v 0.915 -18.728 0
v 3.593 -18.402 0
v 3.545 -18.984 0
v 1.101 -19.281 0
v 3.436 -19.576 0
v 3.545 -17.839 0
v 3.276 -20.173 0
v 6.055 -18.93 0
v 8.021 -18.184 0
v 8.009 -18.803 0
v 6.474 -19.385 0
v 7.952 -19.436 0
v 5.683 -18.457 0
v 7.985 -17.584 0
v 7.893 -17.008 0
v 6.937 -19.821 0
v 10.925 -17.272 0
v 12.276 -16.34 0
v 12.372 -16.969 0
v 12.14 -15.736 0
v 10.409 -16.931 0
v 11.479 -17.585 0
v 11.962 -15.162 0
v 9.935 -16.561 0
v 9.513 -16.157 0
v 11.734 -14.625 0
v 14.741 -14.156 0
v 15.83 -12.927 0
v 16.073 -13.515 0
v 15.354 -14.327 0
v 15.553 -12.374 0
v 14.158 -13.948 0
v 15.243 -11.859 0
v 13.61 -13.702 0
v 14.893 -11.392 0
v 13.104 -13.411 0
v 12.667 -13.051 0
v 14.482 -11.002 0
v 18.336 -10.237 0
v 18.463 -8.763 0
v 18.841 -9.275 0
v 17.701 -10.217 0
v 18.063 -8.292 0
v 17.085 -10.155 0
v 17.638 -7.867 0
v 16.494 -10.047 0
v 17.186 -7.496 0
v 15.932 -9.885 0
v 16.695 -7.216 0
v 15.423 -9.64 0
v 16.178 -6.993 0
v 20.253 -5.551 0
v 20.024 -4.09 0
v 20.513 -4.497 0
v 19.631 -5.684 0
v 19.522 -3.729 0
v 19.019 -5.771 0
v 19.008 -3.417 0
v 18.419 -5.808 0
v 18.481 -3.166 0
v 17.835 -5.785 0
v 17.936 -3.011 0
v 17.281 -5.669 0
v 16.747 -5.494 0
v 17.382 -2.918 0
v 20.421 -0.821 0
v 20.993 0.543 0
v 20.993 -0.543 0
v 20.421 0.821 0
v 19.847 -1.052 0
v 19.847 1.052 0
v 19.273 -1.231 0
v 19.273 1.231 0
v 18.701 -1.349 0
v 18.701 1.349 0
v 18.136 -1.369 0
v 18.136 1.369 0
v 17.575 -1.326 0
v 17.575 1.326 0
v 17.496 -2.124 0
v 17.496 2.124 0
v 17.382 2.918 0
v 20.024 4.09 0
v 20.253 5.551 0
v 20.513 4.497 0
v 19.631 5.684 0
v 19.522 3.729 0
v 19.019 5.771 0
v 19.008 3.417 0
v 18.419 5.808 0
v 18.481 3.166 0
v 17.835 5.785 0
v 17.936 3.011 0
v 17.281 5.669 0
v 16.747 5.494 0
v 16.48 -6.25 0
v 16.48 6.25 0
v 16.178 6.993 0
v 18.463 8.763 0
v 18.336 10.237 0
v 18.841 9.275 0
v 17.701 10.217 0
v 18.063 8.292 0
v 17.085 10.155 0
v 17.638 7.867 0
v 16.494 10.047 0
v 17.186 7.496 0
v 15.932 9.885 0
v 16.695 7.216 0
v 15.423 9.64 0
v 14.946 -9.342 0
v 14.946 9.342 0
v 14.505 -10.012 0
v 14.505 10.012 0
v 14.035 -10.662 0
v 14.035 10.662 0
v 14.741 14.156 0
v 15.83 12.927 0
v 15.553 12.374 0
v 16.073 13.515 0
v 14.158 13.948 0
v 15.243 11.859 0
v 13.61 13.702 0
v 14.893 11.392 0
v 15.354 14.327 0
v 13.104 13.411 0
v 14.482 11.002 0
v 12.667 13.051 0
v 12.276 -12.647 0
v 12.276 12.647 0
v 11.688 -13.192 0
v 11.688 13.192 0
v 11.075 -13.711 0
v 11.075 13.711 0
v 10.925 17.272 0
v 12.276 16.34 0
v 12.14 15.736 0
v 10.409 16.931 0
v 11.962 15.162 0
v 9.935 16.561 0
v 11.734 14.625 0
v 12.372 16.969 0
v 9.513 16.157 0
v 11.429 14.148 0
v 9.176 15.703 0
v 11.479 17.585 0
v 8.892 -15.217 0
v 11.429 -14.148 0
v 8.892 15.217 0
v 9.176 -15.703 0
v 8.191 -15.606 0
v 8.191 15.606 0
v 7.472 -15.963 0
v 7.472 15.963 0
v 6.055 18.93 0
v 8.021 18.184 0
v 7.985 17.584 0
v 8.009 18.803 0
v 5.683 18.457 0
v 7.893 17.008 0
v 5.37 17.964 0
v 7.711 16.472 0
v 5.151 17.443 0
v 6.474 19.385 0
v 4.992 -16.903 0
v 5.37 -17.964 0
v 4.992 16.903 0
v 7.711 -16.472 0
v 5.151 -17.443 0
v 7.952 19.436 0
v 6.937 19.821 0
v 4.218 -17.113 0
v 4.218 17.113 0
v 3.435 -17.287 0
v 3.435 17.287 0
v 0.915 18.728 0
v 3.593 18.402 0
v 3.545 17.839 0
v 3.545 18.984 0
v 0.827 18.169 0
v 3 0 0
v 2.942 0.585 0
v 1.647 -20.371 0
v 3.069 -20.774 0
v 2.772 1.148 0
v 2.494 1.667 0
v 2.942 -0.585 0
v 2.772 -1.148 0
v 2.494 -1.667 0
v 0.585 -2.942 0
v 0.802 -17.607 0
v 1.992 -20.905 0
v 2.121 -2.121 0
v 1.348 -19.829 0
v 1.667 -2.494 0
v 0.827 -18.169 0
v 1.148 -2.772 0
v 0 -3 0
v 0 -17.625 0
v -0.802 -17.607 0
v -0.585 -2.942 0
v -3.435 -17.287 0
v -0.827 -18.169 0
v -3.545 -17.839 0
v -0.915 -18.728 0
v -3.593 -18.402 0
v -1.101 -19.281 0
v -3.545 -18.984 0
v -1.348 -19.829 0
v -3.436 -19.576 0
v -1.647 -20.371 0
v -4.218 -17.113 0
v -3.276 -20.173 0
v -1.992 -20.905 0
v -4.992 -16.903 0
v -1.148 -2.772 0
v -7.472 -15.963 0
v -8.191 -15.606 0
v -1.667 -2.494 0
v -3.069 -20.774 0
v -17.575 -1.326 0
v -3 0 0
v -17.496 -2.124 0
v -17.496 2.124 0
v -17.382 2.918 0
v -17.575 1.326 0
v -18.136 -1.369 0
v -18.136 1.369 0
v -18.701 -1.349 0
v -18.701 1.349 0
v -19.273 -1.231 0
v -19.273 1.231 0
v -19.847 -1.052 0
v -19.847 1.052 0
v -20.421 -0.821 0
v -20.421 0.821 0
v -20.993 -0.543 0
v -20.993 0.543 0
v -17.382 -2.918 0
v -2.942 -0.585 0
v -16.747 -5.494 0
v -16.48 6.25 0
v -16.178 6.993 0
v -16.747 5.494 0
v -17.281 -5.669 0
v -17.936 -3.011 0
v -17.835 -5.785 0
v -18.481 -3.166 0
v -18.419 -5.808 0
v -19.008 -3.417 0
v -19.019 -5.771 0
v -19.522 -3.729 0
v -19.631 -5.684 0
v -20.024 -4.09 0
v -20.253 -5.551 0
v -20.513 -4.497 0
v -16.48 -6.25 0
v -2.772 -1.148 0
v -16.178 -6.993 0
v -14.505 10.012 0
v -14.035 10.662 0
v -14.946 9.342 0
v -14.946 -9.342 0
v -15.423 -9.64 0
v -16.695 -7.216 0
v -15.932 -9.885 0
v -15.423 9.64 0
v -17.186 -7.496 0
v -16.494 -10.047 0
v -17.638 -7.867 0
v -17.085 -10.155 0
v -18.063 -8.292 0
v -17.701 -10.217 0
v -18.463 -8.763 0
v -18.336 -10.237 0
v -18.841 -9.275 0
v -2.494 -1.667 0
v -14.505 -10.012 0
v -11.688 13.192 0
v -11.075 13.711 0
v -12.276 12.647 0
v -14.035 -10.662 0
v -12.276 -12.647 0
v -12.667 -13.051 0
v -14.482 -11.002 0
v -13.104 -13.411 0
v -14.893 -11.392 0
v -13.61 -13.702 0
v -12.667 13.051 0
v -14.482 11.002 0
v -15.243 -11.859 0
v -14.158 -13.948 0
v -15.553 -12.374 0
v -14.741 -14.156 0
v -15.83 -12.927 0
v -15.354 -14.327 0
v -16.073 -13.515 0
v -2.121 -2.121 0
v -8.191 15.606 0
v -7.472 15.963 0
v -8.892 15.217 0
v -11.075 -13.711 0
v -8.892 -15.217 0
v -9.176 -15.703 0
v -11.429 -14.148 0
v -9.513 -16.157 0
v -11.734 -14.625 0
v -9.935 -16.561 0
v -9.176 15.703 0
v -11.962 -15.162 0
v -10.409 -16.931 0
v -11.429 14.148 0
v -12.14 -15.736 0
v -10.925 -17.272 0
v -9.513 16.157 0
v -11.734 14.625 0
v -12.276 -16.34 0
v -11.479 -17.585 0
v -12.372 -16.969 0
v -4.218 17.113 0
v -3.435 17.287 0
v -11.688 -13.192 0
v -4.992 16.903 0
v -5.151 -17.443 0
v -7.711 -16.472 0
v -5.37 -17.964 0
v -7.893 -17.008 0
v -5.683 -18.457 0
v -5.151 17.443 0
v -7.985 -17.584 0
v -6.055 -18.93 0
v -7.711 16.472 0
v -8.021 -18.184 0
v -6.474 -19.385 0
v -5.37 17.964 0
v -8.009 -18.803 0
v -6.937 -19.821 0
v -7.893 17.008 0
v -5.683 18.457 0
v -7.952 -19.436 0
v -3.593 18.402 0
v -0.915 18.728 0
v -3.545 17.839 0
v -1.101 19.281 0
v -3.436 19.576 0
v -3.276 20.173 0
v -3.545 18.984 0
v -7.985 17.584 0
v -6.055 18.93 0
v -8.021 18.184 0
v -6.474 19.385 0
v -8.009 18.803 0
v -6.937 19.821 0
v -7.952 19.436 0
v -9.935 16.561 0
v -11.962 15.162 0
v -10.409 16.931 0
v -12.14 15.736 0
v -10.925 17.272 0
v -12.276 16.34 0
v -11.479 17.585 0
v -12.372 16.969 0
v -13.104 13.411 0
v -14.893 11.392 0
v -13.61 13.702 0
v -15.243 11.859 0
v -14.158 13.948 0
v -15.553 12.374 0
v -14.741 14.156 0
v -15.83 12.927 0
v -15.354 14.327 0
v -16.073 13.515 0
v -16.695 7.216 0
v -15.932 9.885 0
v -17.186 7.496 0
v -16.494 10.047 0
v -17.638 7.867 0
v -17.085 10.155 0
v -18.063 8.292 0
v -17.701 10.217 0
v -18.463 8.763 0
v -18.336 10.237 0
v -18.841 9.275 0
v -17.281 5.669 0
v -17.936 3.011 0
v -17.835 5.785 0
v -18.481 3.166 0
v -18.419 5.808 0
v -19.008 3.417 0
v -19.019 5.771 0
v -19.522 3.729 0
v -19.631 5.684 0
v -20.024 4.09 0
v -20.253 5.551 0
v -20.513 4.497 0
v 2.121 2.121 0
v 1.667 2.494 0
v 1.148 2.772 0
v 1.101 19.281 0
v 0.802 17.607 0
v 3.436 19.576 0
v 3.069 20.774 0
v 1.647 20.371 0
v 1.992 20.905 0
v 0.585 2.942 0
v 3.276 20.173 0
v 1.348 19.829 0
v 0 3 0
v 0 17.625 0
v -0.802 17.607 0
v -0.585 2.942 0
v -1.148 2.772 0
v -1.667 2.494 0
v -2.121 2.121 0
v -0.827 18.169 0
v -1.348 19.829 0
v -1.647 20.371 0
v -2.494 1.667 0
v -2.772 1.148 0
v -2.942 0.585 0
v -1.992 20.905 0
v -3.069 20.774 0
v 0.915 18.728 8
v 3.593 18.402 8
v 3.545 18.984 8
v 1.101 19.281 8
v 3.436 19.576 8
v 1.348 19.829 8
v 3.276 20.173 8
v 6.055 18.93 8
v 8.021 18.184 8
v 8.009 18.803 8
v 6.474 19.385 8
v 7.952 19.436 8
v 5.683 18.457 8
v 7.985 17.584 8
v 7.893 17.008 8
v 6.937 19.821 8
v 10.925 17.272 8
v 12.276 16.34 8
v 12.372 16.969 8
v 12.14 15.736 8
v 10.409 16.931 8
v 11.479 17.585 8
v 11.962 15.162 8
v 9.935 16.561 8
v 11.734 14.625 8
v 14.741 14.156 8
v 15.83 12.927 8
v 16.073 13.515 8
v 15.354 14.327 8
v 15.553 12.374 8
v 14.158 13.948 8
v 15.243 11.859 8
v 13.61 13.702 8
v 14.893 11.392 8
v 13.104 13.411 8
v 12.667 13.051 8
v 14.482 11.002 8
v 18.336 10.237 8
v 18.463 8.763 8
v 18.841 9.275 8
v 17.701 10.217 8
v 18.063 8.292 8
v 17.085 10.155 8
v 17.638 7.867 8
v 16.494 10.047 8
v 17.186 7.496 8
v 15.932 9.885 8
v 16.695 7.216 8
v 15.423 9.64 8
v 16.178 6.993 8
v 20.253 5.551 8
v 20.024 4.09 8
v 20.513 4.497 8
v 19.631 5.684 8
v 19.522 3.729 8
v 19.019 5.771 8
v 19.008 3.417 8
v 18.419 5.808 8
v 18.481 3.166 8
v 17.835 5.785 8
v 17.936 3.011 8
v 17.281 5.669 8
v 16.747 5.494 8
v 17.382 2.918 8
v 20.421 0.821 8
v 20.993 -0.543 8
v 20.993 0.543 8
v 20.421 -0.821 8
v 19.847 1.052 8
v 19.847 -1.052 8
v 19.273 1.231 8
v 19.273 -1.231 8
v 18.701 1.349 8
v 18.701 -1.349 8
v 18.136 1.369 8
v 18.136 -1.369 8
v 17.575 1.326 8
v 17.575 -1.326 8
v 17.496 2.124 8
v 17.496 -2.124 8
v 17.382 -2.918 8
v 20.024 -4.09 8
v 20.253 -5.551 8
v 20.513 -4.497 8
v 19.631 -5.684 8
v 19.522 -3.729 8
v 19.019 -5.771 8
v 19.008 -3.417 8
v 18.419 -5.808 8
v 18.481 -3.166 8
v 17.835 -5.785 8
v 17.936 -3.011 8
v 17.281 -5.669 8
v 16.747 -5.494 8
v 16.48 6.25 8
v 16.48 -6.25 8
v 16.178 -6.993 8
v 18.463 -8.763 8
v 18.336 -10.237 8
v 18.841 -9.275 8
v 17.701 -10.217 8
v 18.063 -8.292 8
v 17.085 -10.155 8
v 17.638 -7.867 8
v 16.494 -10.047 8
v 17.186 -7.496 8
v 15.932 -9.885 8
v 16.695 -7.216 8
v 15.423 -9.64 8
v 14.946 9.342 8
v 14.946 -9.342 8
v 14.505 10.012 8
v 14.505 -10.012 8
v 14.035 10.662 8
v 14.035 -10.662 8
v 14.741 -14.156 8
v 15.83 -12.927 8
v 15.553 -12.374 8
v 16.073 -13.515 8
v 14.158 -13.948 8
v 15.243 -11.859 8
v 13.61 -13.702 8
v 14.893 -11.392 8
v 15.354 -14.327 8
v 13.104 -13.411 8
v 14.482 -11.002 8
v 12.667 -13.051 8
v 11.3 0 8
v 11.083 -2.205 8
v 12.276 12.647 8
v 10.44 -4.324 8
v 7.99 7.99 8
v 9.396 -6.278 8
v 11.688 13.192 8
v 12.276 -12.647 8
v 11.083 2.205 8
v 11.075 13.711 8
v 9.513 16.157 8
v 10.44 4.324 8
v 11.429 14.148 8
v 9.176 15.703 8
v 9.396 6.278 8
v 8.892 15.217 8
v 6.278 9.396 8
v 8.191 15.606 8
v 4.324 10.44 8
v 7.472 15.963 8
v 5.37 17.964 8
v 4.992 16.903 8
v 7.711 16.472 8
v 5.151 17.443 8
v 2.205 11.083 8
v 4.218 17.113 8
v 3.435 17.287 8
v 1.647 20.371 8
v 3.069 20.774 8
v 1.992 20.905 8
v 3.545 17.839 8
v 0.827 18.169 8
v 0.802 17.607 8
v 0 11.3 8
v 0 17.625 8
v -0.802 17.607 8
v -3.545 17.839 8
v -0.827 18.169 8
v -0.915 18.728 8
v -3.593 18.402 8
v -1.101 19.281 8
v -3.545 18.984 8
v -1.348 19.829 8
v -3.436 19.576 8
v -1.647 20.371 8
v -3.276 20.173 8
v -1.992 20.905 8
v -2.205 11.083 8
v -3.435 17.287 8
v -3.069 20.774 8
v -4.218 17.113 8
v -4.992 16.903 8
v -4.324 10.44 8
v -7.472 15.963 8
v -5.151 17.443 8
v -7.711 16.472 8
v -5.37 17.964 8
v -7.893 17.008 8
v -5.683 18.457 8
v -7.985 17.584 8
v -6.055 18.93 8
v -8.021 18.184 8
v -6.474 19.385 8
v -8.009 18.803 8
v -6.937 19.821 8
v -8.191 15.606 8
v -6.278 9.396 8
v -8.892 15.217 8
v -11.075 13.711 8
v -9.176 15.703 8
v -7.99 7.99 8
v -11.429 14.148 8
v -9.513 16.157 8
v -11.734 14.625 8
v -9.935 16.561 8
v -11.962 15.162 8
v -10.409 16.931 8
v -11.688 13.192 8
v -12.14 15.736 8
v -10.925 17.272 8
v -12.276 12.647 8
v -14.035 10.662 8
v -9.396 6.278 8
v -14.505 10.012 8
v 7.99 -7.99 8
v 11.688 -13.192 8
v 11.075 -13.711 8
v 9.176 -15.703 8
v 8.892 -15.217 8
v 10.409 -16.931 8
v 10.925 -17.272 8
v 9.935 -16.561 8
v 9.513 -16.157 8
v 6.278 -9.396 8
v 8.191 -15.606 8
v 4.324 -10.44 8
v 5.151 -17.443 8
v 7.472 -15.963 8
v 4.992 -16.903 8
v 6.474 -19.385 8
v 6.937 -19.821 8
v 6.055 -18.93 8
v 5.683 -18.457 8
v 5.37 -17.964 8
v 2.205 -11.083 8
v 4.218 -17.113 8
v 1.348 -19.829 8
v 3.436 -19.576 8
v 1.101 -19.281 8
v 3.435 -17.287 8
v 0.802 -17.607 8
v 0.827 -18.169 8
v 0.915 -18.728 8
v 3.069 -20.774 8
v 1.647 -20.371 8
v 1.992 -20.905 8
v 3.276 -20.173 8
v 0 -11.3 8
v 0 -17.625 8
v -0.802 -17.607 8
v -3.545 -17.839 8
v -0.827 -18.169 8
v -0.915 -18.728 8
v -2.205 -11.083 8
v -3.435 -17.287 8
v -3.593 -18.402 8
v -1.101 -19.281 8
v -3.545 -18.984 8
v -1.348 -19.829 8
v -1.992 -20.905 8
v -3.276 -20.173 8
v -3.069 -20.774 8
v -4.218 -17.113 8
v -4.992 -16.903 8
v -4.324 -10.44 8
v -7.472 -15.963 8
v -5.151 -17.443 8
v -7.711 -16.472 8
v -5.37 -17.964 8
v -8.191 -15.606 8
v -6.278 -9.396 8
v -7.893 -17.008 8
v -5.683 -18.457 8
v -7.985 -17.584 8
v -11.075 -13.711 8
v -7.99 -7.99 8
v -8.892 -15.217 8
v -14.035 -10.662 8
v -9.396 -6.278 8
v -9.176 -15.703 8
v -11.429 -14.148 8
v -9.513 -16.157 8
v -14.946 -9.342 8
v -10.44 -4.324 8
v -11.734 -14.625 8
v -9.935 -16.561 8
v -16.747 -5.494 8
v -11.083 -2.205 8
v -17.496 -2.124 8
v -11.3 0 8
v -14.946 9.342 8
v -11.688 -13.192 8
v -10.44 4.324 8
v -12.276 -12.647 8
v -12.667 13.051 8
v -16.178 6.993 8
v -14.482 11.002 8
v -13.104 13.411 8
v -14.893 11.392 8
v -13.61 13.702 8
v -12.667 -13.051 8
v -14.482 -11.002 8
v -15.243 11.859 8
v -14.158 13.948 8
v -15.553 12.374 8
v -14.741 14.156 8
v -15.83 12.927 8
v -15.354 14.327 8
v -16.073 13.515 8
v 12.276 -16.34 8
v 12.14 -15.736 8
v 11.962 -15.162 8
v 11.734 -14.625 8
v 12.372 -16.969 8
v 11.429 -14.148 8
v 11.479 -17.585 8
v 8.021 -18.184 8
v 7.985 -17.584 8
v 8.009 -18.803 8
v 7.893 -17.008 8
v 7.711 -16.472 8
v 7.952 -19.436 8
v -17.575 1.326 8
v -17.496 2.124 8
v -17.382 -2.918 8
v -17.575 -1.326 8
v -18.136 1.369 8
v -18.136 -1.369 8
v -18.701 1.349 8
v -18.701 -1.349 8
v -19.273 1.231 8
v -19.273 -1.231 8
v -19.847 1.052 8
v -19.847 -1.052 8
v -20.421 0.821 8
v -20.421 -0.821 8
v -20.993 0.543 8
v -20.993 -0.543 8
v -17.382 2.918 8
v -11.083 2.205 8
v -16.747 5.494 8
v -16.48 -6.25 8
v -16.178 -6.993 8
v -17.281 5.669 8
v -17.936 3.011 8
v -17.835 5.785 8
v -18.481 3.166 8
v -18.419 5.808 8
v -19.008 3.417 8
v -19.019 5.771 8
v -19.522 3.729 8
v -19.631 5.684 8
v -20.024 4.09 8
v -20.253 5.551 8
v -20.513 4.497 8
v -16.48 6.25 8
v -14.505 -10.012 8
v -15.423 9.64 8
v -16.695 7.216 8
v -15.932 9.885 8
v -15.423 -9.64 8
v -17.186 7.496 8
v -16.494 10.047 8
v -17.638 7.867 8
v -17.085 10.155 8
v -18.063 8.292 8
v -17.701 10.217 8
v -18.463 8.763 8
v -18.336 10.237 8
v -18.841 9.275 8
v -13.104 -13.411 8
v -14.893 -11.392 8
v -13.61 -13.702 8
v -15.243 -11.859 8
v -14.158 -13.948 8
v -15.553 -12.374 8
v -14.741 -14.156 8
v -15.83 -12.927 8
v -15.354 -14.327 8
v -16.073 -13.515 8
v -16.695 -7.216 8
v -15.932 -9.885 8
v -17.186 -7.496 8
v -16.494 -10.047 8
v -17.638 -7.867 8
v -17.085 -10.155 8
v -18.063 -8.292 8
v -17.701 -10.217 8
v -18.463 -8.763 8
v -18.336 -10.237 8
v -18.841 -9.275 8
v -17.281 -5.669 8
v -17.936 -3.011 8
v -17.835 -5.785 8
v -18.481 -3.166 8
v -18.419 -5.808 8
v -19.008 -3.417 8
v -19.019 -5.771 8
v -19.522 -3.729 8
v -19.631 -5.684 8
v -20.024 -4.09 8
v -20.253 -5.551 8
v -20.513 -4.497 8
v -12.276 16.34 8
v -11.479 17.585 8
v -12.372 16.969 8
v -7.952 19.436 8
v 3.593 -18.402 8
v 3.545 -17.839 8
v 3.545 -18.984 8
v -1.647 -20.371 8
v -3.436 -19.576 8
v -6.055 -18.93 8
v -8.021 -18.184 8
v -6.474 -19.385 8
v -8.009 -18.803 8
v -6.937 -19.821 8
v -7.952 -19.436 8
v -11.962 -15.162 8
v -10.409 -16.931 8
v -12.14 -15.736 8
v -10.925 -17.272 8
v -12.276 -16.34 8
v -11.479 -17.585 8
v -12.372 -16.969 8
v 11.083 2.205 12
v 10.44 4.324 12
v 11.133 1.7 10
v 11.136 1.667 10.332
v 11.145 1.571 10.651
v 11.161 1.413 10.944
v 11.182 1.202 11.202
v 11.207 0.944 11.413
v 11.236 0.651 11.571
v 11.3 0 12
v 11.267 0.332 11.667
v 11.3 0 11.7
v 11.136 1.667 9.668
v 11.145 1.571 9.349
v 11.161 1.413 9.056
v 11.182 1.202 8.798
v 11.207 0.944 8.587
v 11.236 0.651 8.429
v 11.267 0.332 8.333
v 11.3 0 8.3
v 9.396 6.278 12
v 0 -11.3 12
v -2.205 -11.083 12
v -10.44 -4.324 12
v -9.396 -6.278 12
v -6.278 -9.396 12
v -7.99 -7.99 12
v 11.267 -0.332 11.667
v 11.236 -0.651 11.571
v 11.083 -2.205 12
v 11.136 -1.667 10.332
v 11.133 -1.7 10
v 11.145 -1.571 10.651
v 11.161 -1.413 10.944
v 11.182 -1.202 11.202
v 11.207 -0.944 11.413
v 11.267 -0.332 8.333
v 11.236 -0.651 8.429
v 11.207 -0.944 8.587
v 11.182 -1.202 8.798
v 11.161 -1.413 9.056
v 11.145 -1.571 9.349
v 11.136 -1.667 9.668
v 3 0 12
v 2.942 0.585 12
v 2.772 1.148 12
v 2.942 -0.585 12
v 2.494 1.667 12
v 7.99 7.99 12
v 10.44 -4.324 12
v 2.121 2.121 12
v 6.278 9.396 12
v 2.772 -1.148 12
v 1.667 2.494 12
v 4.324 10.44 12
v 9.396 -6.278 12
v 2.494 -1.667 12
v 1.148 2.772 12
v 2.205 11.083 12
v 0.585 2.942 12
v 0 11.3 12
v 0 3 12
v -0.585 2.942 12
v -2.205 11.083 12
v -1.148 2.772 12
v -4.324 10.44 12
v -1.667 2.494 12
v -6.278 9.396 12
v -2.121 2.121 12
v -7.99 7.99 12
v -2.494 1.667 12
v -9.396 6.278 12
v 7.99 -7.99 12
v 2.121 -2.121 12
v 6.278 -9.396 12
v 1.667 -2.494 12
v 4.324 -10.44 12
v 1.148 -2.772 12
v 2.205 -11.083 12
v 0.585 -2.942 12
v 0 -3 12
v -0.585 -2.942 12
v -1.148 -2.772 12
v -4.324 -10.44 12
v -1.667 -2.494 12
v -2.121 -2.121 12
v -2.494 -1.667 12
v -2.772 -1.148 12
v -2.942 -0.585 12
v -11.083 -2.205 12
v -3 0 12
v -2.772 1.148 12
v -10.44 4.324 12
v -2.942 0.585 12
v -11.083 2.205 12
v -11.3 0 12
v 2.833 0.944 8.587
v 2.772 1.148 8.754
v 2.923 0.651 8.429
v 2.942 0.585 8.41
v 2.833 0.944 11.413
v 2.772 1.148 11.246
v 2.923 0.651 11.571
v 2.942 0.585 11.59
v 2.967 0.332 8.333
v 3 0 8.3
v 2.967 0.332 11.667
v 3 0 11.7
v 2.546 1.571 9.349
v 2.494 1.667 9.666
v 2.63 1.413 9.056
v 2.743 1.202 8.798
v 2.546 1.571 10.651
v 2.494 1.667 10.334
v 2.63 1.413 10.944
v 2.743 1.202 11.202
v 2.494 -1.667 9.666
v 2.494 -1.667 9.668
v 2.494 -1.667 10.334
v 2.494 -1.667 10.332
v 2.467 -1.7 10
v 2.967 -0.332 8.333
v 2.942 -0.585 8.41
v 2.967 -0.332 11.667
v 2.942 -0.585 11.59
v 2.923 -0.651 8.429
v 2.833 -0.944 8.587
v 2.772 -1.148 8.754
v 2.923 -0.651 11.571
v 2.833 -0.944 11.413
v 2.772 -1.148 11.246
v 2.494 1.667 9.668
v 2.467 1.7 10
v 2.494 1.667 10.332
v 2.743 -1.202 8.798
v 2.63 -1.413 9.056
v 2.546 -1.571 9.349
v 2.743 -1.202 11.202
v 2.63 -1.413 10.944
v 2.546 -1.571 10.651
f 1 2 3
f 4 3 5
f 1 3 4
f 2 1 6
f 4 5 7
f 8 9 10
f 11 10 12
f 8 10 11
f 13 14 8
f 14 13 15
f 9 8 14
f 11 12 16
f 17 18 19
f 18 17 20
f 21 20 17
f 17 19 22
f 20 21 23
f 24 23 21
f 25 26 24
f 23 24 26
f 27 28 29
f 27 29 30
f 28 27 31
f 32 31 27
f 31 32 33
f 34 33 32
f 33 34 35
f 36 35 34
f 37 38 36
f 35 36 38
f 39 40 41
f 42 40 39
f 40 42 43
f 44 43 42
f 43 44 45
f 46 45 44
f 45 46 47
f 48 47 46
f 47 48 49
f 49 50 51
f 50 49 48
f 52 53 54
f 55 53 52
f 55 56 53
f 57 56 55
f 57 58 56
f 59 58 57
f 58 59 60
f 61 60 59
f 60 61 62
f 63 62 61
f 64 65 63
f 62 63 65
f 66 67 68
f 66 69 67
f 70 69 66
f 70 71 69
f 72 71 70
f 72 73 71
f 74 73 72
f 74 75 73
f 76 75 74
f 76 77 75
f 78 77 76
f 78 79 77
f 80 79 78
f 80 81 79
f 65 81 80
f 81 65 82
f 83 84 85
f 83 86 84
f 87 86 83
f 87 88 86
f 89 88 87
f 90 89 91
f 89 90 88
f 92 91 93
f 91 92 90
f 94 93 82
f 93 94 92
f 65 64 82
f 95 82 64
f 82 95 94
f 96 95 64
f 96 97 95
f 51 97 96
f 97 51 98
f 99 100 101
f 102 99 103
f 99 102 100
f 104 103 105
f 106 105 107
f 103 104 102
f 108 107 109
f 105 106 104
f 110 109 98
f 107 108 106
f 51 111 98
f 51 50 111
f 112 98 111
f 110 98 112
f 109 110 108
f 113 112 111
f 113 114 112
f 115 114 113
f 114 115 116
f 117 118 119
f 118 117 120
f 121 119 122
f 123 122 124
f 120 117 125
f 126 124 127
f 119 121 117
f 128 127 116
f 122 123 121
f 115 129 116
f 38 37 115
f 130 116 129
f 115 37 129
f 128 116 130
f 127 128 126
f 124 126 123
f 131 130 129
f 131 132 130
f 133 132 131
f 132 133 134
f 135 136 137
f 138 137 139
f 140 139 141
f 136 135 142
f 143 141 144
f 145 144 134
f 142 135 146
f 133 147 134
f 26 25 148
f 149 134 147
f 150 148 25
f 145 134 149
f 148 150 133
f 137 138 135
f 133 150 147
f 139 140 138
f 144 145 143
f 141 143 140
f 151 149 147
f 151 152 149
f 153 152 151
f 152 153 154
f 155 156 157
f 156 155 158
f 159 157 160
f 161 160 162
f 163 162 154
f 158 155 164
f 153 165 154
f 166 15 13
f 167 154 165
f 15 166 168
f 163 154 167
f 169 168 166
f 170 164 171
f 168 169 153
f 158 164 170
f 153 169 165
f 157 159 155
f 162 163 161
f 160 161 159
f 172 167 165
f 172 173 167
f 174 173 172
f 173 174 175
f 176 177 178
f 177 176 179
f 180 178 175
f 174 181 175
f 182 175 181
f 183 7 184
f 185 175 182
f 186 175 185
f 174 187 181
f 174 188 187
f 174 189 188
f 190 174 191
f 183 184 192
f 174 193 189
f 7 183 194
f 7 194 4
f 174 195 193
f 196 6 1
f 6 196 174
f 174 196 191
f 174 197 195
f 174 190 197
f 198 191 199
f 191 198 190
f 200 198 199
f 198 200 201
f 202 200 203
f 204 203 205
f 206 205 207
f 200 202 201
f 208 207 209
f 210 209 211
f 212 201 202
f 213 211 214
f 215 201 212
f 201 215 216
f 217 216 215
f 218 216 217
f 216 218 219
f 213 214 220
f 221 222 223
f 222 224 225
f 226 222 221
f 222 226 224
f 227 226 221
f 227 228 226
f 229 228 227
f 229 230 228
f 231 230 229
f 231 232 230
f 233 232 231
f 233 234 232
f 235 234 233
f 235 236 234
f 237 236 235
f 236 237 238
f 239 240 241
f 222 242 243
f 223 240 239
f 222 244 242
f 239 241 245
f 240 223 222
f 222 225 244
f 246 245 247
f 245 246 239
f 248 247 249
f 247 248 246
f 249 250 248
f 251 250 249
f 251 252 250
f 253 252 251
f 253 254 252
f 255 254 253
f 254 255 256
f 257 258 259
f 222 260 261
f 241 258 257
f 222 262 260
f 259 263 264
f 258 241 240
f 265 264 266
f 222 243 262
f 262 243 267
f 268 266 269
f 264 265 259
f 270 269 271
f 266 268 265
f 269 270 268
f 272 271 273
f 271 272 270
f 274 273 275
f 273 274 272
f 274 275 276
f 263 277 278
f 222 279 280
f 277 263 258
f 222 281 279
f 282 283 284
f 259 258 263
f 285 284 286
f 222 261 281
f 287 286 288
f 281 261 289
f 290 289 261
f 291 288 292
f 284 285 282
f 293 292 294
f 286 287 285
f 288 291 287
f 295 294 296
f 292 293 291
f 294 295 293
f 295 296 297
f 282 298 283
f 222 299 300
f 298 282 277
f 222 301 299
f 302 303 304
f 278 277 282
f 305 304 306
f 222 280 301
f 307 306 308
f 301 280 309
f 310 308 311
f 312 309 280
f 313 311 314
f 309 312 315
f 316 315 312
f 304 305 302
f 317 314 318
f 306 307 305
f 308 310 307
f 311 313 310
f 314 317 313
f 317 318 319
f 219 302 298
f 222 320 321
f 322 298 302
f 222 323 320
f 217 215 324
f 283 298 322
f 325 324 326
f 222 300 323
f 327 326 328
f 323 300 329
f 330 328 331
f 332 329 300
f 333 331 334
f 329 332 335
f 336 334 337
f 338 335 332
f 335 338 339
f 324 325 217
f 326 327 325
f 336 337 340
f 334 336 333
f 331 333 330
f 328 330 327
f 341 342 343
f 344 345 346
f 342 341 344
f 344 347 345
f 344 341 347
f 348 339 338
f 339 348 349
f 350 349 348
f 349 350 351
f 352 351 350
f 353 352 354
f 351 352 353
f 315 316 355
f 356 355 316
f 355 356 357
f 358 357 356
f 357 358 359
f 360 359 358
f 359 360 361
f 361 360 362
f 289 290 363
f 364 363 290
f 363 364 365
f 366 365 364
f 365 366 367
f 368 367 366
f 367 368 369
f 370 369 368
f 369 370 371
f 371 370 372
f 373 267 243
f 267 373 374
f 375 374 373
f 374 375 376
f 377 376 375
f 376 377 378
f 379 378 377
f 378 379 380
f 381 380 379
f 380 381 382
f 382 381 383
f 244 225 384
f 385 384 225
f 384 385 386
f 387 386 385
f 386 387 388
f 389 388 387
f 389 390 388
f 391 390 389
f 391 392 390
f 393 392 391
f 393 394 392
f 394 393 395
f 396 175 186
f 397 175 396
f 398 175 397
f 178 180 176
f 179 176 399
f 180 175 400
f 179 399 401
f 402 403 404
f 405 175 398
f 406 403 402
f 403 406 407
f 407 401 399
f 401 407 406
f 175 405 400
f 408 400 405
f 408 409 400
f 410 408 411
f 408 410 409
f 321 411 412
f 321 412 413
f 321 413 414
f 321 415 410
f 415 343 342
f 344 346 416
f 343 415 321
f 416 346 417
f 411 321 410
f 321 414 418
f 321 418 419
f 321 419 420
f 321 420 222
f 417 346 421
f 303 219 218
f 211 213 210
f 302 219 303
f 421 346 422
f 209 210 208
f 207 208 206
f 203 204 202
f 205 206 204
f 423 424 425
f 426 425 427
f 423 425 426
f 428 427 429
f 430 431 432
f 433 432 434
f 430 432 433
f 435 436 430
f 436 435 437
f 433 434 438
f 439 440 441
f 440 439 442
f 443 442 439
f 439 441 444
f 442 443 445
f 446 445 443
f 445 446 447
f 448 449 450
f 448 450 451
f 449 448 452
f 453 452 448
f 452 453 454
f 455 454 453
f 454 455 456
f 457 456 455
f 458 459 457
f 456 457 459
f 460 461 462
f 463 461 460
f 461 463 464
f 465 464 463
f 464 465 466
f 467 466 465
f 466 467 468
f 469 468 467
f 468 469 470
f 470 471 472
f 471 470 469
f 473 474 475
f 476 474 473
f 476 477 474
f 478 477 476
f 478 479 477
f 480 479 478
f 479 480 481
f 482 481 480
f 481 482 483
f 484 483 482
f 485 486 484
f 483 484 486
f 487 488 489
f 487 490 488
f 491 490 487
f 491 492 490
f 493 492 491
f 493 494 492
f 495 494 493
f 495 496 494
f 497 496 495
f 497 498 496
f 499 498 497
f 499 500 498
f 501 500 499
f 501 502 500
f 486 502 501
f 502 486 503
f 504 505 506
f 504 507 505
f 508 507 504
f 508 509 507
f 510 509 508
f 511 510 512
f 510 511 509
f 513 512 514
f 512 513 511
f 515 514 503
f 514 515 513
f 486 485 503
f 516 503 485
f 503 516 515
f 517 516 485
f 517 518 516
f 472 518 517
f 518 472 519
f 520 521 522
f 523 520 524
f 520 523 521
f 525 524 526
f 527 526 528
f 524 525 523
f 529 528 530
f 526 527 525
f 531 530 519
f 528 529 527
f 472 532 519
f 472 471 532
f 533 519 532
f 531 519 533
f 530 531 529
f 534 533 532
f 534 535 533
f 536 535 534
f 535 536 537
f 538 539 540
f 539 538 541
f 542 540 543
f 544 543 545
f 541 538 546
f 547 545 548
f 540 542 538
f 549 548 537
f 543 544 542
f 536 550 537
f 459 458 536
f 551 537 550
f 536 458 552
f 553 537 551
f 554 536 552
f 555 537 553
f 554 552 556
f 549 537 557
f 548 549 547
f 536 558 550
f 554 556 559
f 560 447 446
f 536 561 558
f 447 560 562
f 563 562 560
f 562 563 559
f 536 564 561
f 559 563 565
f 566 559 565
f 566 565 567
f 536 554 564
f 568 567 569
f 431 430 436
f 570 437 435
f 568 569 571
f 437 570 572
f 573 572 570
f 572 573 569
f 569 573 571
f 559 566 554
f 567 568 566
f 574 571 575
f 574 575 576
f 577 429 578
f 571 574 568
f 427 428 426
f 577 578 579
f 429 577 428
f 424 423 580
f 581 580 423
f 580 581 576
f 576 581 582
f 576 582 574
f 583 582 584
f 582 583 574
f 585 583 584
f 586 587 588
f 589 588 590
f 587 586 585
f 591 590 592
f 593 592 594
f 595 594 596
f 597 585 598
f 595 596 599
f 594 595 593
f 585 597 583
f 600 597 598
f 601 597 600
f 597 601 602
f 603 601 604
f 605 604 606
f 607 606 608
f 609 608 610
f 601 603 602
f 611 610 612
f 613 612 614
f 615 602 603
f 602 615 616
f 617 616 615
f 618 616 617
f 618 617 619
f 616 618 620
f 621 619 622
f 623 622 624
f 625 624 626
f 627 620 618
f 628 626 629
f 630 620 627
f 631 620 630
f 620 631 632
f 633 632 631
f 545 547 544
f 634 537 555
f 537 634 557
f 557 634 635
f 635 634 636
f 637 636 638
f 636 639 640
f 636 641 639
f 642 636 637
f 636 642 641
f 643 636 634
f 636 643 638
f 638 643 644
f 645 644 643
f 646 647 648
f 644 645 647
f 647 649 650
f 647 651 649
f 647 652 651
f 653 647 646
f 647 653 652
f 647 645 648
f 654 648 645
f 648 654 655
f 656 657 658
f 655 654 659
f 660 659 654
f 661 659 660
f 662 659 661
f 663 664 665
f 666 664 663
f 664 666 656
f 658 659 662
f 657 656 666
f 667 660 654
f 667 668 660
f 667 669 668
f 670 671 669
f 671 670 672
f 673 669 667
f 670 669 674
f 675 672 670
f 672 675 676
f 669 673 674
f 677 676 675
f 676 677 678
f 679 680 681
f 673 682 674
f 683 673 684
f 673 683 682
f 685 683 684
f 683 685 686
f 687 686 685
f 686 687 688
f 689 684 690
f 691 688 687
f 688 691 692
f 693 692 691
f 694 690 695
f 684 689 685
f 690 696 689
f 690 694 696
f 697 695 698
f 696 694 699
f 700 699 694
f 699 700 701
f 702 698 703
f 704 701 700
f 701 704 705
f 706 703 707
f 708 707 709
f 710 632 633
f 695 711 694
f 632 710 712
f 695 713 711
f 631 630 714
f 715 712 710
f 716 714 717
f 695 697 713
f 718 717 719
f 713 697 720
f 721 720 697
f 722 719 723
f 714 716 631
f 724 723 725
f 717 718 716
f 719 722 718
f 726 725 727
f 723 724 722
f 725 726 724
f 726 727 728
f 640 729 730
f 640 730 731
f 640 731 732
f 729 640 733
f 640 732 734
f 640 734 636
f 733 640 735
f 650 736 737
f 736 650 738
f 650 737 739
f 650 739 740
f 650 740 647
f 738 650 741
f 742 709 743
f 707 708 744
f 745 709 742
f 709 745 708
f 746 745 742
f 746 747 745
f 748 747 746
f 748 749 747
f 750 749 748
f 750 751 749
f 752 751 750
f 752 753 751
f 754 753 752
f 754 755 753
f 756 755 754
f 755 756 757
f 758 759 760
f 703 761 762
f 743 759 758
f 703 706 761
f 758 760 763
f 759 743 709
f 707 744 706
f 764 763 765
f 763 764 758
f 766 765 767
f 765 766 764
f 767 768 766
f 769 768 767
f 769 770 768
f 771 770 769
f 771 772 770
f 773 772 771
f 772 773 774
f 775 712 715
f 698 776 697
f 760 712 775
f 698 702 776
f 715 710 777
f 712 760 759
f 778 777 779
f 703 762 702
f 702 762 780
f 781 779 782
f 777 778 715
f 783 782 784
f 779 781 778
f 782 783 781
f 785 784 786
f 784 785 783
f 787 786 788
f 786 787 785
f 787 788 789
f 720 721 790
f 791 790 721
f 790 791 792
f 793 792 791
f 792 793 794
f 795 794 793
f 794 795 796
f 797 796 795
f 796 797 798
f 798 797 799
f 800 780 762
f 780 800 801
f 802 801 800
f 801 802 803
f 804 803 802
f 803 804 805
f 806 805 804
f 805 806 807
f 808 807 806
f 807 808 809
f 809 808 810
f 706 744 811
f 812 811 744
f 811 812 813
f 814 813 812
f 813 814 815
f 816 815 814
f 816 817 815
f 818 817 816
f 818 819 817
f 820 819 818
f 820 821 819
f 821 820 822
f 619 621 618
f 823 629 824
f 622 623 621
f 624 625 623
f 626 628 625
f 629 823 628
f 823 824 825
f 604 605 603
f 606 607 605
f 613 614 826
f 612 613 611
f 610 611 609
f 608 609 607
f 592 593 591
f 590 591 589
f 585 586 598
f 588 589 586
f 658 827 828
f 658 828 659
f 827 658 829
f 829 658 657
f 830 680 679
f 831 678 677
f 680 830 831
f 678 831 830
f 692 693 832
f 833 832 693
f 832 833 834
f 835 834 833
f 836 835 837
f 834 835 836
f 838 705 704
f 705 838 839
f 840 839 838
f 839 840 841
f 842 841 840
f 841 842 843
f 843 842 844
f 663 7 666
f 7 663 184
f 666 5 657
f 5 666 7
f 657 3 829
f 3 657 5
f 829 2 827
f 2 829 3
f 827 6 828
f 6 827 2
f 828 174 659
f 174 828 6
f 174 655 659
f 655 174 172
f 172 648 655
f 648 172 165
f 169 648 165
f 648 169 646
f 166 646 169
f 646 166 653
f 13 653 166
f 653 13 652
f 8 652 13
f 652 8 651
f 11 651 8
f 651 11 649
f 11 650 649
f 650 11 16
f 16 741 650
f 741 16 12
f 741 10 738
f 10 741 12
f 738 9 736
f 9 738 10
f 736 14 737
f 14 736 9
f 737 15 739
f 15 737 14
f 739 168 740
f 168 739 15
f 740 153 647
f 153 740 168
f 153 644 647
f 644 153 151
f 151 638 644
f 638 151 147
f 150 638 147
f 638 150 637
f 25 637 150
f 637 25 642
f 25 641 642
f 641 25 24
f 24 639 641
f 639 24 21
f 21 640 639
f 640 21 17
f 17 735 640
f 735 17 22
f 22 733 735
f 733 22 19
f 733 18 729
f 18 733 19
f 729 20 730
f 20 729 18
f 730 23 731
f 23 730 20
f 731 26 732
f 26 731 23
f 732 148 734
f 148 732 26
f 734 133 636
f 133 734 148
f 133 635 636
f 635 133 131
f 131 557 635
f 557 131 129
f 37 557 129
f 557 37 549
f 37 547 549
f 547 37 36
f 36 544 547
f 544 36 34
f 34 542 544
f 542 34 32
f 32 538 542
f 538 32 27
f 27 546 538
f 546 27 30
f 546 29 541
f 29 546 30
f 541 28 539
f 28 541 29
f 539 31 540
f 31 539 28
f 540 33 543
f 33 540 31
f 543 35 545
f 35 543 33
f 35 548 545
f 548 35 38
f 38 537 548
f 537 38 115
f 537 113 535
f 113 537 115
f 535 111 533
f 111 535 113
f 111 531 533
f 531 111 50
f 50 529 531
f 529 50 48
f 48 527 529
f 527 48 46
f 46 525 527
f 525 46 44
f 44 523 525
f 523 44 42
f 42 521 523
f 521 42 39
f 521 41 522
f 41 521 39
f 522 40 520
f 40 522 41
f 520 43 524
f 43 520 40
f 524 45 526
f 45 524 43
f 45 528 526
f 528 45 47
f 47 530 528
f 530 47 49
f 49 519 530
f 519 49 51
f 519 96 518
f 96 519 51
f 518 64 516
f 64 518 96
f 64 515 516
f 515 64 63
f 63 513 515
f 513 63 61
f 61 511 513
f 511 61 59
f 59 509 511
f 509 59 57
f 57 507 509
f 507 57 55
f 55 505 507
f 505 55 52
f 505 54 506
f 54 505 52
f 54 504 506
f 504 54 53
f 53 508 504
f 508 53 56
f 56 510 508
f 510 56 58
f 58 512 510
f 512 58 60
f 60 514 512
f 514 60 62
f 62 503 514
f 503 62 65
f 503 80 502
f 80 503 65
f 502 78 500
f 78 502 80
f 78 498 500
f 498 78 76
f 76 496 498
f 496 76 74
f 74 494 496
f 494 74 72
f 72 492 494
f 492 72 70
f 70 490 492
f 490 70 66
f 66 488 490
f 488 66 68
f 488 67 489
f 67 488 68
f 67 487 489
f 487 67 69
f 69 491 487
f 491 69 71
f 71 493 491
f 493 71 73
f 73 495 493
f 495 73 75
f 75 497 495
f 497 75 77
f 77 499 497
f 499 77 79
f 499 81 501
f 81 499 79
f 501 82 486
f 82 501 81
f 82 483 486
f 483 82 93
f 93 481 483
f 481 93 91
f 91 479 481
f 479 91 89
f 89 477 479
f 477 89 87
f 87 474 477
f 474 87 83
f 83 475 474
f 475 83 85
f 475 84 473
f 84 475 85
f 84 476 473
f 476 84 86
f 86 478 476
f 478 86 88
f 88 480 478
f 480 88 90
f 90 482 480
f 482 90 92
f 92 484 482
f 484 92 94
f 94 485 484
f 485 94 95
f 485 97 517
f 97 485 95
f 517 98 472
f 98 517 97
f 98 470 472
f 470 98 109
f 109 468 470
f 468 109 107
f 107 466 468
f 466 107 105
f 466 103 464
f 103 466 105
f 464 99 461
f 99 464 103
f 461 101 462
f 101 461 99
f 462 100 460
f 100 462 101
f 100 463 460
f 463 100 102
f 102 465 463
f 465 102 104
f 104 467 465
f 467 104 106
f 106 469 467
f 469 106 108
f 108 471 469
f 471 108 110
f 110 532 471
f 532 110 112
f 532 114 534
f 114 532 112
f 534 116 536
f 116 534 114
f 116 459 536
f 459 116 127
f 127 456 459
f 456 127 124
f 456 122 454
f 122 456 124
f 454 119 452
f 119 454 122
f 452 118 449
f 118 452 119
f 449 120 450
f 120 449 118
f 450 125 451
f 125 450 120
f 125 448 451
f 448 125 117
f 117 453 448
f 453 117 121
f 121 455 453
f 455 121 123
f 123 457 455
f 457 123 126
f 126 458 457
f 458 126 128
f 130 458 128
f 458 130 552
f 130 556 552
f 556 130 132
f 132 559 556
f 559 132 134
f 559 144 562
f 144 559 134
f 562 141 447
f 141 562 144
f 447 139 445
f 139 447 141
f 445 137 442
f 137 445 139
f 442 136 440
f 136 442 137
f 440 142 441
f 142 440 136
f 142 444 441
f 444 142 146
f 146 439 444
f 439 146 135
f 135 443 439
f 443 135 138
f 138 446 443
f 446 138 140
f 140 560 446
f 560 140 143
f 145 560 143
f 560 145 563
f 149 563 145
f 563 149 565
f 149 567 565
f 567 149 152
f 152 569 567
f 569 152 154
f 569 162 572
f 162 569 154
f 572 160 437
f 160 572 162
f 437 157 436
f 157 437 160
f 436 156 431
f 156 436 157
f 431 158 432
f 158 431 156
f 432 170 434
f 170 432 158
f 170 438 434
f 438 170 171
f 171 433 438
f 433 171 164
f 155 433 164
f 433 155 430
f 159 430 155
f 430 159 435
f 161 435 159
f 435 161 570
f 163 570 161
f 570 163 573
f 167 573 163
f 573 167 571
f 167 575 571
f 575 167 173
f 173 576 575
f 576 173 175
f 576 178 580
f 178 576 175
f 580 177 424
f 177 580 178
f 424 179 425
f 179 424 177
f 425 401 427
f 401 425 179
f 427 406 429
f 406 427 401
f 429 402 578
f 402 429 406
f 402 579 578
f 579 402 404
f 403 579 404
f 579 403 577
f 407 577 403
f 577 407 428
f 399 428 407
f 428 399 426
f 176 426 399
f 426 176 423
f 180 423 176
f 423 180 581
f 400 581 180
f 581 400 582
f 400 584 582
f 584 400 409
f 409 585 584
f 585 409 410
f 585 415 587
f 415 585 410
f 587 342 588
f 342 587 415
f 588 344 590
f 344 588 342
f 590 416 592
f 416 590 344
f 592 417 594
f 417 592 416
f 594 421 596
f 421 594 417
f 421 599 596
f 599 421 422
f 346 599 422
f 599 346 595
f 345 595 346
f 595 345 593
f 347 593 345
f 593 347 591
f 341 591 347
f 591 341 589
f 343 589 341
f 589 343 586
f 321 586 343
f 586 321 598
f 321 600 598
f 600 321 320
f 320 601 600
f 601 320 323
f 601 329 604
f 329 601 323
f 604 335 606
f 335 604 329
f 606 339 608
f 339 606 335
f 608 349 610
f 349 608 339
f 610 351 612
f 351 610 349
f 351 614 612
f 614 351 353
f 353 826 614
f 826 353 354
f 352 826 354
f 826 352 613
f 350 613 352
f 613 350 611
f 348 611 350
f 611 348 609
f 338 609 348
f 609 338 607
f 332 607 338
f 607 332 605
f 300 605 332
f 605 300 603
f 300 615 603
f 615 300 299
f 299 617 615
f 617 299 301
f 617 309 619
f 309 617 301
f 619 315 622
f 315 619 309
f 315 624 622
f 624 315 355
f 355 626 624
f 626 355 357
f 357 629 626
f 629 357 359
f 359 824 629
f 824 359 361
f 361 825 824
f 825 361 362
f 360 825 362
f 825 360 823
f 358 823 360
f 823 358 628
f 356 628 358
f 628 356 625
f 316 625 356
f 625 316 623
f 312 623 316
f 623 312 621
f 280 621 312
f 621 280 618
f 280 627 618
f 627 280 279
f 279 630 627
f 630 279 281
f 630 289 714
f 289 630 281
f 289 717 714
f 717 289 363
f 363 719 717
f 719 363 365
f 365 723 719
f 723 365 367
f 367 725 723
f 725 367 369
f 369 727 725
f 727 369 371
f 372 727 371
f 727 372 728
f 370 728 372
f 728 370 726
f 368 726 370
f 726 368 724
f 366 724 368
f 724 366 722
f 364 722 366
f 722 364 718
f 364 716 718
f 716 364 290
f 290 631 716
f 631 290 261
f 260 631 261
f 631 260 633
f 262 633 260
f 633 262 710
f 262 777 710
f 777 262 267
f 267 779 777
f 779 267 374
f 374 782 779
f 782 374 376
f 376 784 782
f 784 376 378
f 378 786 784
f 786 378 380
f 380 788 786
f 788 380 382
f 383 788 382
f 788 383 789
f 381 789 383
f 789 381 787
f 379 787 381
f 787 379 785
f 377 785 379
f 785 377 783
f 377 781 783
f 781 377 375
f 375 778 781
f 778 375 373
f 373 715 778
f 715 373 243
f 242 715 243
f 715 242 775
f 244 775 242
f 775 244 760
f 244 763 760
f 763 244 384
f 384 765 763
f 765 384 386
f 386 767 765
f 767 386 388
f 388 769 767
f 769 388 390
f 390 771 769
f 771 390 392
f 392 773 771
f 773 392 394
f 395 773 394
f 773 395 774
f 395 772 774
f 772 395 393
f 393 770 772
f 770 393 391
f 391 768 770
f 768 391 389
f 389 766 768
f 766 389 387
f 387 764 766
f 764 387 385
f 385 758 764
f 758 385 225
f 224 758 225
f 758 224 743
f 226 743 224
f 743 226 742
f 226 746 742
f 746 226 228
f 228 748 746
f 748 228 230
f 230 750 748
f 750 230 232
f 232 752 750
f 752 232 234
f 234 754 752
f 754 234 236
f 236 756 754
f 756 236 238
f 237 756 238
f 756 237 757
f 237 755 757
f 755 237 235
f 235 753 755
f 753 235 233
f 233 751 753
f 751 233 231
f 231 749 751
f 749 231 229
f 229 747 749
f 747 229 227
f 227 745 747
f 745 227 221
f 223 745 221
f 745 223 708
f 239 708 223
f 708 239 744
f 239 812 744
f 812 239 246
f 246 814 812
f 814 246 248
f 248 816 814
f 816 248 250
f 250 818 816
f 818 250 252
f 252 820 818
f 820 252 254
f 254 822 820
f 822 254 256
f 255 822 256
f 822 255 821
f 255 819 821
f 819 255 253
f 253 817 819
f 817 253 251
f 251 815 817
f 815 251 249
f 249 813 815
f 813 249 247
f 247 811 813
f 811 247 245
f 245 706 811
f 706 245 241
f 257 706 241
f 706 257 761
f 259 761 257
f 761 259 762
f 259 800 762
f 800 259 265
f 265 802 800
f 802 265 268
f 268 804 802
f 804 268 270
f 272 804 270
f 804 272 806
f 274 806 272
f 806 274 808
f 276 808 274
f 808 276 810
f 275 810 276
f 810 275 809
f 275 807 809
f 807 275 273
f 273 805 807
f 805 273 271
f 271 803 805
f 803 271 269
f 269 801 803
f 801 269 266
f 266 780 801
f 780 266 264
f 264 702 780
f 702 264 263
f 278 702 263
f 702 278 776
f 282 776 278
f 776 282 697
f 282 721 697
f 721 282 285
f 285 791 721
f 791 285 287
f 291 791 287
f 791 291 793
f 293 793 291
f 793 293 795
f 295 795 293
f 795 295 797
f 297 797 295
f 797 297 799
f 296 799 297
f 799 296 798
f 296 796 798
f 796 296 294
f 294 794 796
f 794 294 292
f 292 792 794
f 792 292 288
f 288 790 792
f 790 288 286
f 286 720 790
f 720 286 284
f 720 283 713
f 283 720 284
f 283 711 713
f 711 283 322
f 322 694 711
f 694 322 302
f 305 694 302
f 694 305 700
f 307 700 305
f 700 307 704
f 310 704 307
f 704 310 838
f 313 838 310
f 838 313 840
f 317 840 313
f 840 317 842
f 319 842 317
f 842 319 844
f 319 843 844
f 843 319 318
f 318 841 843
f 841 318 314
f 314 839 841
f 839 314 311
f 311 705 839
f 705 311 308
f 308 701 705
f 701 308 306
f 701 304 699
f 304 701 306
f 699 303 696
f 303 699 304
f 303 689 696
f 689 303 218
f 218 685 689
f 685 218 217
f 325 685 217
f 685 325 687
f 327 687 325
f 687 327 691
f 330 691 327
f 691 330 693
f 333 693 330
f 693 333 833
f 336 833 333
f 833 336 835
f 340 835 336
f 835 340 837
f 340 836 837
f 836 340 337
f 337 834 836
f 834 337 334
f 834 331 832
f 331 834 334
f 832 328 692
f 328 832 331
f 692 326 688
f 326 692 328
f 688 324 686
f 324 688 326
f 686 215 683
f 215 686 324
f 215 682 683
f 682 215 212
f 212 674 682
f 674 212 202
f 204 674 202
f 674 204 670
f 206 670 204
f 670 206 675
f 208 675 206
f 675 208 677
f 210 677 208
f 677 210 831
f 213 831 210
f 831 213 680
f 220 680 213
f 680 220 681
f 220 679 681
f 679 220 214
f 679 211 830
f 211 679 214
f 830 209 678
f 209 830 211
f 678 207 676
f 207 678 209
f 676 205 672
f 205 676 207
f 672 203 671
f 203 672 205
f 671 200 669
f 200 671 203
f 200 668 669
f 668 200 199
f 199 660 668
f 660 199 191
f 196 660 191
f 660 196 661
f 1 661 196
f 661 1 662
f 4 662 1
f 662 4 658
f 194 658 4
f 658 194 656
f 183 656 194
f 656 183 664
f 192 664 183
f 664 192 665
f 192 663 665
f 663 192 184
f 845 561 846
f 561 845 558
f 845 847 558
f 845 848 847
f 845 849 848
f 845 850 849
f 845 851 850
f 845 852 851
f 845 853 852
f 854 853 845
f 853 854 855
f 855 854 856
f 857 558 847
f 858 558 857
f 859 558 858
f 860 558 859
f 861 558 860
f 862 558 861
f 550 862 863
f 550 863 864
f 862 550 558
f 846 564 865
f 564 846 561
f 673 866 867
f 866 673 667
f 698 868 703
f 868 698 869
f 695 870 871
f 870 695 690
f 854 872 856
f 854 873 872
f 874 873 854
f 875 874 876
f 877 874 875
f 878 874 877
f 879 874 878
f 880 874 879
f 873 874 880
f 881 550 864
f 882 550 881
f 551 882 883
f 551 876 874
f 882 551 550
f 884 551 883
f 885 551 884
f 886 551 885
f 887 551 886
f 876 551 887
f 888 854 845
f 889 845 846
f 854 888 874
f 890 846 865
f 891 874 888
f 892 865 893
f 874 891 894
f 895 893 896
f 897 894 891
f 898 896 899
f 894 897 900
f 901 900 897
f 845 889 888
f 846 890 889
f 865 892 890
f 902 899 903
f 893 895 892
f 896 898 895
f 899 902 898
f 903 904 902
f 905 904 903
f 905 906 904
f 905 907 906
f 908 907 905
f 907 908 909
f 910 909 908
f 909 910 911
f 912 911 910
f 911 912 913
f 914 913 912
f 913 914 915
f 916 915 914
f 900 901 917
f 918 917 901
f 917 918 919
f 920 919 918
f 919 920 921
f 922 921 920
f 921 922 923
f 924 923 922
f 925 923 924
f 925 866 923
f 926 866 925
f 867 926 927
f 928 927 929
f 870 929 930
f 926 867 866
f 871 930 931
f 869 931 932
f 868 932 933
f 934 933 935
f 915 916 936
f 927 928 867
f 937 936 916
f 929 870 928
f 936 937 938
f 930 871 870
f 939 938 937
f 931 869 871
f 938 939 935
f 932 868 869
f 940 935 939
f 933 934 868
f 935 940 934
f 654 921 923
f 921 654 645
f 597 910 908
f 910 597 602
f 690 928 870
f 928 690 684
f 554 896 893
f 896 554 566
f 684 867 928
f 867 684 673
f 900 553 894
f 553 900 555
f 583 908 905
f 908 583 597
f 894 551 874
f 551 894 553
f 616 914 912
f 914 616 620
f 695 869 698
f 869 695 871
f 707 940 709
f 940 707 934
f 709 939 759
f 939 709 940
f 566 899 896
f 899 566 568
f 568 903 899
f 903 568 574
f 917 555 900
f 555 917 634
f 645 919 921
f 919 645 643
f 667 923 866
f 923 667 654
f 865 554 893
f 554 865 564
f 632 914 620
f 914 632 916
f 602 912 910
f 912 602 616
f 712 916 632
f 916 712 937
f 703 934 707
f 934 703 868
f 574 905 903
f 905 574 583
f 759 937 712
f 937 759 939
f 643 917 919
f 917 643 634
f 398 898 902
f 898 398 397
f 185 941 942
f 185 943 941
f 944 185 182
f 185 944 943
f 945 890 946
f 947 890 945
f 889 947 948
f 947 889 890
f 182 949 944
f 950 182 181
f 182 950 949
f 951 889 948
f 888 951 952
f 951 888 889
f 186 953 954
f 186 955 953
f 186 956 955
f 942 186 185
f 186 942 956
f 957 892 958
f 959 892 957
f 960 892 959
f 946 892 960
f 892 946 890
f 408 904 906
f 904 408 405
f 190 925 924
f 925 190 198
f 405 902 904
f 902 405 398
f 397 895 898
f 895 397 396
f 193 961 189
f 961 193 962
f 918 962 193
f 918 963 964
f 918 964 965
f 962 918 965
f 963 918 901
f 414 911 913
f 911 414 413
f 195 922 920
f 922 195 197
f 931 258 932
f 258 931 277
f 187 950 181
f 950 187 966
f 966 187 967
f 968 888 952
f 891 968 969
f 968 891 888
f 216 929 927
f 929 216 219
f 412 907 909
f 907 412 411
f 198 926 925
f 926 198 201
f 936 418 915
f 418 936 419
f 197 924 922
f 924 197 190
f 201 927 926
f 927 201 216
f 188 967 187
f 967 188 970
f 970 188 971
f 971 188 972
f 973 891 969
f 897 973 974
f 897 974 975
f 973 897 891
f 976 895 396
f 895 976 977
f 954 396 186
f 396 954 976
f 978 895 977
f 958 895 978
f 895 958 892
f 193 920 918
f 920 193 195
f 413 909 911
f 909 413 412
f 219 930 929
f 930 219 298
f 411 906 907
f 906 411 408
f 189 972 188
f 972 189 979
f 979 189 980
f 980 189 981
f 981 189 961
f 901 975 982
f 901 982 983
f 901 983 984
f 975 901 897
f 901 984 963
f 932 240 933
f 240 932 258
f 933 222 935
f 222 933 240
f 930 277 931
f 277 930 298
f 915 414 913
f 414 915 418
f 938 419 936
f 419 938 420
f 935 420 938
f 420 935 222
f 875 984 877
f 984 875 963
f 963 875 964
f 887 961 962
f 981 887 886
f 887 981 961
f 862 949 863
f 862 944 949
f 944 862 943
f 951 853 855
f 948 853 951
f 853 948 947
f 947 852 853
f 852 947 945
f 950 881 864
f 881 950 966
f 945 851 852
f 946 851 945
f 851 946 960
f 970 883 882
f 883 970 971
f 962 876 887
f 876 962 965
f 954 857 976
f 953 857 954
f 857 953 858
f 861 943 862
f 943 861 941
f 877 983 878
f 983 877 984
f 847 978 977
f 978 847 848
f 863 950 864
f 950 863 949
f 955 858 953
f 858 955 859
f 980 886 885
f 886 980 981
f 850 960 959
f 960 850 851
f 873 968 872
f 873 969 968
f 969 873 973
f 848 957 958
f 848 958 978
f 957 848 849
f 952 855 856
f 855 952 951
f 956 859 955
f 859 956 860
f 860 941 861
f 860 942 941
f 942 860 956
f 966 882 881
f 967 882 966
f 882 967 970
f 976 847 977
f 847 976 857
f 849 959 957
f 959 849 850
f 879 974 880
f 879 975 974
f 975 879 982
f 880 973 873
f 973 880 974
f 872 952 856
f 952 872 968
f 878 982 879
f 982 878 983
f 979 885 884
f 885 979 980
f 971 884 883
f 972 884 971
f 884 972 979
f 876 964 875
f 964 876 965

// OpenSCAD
$fn = 32;

// ----------------------------------------------------------------------
// Spur gear: m=1.5 z=26, 42 mm tip diameter x 12 mm
// ----------------------------------------------------------------------

// --- parameters (mm) ---
modul = 1.5;              // module
n_teeth = 26;             // number of teeth
width = 8;                // face width
pa = 20;                  // pressure angle, deg
shaft_d = 6;              // shaft bore
boss_d = 22.6;            // hub diameter
boss_h = 4;               // hub above the face
set_d = 3.4;              // set screw tap hole
set_z = 10;               // set screw height

/* --- involute profile --- */
pitch_r = modul * n_teeth / 2;
base_r = pitch_r * cos(pa);
tip_r = pitch_r + modul;
root_r = pitch_r - 1.25 * modul;
flank_steps = 6;

function inv_deg(a) = (tan(a) - a * PI / 180) * 180 / PI;
function flank_r(i) = root_r + (tip_r - root_r) * i / flank_steps;
function half_angle(r) = 90 / n_teeth + inv_deg(pa) - inv_deg(acos(min(1, base_r / r)));
function tooth_pt(k, i, side) =
    let (r = flank_r(i), a = k * 360 / n_teeth + side * half_angle(r))
    [r * cos(a), r * sin(a)];

module tooth_profile() {
  polygon(points = [
    for (k = [0 : n_teeth - 1])
      each [
        for (i = [0 : flank_steps]) tooth_pt(k, i, -1),
        for (i = [flank_steps : -1 : 0]) tooth_pt(k, i, 1),
        let (ta = (k + 0.5) * 360 / n_teeth)
          [root_r * cos(ta), root_r * sin(ta)]
      ]
  ]);
}

module gear_disc() {
  linear_extrude(height = width) tooth_profile();
}

module hub_boss() {
  translate([0, 0, width - 1]) cylinder(h = boss_h + 1, d = boss_d);
}

difference() {
  union() {
    gear_disc();
    hub_boss();
  }
  translate([0, 0, -1]) cylinder(h = width + boss_h + 3, d = shaft_d);
  /* set screw, drilled radially */
  translate([-1, 0, set_z]) rotate([0, 90, 0]) cylinder(h = boss_d / 2 + 3, d = set_d);
}
